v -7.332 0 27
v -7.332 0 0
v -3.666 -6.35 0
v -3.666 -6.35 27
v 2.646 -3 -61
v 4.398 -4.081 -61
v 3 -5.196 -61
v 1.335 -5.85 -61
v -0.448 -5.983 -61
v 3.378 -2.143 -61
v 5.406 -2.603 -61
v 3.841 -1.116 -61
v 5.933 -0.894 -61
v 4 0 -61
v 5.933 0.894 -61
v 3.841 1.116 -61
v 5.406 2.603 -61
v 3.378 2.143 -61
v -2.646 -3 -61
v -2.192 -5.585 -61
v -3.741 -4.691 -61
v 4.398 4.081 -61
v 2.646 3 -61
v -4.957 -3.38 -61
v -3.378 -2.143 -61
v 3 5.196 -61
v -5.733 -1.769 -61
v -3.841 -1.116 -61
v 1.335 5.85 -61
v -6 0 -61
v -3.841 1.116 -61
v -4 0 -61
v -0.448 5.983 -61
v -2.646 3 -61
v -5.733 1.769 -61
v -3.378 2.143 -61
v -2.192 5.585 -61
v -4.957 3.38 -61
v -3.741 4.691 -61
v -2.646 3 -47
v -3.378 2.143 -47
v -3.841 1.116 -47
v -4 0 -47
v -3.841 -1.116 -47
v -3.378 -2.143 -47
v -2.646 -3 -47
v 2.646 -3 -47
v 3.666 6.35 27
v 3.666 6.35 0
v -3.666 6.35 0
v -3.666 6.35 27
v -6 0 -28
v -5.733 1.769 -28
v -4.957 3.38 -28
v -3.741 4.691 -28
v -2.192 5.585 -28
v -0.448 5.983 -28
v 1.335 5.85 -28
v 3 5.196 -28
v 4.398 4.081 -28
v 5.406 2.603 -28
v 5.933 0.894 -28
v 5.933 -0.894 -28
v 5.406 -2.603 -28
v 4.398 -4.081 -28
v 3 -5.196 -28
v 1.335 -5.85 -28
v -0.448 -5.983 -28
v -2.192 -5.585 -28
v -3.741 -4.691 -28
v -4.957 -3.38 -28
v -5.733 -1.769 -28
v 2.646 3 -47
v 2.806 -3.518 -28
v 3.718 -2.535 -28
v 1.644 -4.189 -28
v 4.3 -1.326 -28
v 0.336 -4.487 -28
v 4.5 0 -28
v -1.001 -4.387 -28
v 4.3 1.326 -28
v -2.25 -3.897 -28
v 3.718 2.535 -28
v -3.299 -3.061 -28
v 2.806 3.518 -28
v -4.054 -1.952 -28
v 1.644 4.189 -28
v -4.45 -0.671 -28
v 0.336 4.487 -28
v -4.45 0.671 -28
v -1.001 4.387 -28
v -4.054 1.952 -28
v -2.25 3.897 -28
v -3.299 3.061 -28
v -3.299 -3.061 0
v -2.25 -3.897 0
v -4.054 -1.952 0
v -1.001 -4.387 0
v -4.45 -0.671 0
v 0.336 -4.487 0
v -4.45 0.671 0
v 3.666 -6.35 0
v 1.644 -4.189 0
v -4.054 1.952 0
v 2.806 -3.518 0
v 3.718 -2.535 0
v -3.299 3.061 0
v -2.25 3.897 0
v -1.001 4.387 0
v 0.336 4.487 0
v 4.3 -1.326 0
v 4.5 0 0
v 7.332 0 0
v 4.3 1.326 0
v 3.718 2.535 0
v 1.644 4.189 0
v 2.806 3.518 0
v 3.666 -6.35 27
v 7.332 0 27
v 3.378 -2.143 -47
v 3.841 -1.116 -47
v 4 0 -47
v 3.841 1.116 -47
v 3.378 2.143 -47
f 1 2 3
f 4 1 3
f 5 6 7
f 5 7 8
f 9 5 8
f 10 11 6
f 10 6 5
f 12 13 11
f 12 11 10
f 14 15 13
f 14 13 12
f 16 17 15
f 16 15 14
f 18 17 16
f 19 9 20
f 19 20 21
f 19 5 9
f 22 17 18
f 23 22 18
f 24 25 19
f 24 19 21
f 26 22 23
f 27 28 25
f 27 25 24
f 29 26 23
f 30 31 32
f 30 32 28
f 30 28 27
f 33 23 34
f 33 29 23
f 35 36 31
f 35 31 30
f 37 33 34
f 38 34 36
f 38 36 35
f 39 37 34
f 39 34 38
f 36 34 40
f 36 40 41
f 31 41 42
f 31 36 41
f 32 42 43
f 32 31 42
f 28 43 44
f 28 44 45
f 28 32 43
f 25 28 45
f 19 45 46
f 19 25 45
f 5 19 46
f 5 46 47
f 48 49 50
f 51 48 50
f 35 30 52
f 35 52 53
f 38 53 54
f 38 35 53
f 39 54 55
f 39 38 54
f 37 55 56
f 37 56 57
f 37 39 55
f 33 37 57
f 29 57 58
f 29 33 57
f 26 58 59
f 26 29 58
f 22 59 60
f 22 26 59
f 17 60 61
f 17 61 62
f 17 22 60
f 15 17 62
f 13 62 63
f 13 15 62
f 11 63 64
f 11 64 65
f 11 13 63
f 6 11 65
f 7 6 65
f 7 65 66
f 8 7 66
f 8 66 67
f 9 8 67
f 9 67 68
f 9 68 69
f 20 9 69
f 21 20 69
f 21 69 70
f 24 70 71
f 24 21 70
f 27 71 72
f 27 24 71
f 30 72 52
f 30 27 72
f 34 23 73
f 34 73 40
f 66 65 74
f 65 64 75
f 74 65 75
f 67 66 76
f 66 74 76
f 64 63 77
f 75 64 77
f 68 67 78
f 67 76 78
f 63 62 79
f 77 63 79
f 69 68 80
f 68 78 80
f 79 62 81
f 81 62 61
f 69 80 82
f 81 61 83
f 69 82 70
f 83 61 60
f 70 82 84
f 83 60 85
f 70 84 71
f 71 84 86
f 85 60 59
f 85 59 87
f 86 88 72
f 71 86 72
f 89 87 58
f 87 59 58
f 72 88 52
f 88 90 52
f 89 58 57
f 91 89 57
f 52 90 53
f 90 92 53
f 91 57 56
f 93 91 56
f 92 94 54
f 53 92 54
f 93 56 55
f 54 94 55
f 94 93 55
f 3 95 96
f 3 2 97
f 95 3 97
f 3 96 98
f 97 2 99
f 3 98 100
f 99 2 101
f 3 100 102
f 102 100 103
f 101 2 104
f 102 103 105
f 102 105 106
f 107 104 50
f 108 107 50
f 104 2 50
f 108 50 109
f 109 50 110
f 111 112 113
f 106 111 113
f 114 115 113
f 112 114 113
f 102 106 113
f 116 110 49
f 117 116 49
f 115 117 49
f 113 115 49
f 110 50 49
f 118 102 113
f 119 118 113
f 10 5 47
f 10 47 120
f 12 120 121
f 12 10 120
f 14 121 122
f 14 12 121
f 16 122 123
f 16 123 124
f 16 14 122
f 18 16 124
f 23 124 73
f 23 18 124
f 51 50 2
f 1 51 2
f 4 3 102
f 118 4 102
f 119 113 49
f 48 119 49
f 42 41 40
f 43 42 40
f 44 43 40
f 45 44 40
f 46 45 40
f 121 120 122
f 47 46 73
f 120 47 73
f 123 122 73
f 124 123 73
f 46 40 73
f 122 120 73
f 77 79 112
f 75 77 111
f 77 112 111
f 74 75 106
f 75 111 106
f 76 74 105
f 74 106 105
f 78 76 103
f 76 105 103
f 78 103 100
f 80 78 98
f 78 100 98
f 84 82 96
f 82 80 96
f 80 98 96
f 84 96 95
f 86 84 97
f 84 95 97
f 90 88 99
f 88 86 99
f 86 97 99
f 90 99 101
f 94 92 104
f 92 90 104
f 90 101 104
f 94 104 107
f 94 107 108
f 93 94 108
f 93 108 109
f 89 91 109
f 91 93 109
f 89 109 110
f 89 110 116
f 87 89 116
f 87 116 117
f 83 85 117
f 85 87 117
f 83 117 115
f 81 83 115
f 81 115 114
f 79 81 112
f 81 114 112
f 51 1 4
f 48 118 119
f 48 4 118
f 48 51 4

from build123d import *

# Parameters (mm, degrees)
BOSS_EXTRUDE1_DEPTH = 27
SKETCH2_R           = 4.5
BOSS_EXTRUDE2_DEPTH = 61
CUT_EXTRUDE1_DEPTH  = 14
SKETCH4_R           = 6
BOSS_EXTRUDE3_DEPTH = 33


with BuildPart() as part:
    # Sketch1 → Boss-Extrude1 (new body)
    with BuildSketch(Plane.XY):
        Polygon((3.666174209, -6.35), (7.332348419, 0), (3.666174209, 6.35), (-3.666174209, 6.35), (-7.332348419, 0), (-3.666174209, -6.35), align=None)
    extrude(amount=BOSS_EXTRUDE1_DEPTH)

    # Sketch2 → Boss-Extrude2 (add)
    with BuildSketch(Plane(origin=(0, 0, 0), x_dir=(-1, 0, 0), z_dir=(0, 0, -1))):
        with Locations(Location((0, 0, 0), (0, 0, 180))):
            Circle(SKETCH2_R)
    extrude(amount=BOSS_EXTRUDE2_DEPTH)

    # Sketch3 → Cut-Extrude1 (cut)
    with BuildSketch(Plane(origin=(0, 0, -61), x_dir=(-1, 0, 0), z_dir=(0, 0, -1))):
        with BuildLine():
            Line((-2.645751311, 3), (2.645751311, 3))
            ThreePointArc((2.645751311, 3), (4, 0), (2.645751311, -3))
            Line((2.645751311, -3), (-2.645751311, -3))
            ThreePointArc((-2.645751311, -3), (-4, 0), (-2.645751311, 3))
        make_face()
    extrude(amount=-CUT_EXTRUDE1_DEPTH, mode=Mode.SUBTRACT)

    # Sketch4 → Boss-Extrude3 (add)
    with BuildSketch(Plane(origin=(0, 0, -61), x_dir=(-1, 0, 0), z_dir=(0, 0, -1))):
        Circle(SKETCH4_R)
        with BuildLine():
            Line((-2.645751311, -3), (2.645751311, -3))
            ThreePointArc((2.645751311, -3), (4, 0), (2.645751311, 3))
            Line((2.645751311, 3), (-2.645751311, 3))
            ThreePointArc((-2.645751311, 3), (-4, 0), (-2.645751311, -3))
        make_face(mode=Mode.SUBTRACT)
    extrude(amount=-BOSS_EXTRUDE3_DEPTH)


solid = part.part
